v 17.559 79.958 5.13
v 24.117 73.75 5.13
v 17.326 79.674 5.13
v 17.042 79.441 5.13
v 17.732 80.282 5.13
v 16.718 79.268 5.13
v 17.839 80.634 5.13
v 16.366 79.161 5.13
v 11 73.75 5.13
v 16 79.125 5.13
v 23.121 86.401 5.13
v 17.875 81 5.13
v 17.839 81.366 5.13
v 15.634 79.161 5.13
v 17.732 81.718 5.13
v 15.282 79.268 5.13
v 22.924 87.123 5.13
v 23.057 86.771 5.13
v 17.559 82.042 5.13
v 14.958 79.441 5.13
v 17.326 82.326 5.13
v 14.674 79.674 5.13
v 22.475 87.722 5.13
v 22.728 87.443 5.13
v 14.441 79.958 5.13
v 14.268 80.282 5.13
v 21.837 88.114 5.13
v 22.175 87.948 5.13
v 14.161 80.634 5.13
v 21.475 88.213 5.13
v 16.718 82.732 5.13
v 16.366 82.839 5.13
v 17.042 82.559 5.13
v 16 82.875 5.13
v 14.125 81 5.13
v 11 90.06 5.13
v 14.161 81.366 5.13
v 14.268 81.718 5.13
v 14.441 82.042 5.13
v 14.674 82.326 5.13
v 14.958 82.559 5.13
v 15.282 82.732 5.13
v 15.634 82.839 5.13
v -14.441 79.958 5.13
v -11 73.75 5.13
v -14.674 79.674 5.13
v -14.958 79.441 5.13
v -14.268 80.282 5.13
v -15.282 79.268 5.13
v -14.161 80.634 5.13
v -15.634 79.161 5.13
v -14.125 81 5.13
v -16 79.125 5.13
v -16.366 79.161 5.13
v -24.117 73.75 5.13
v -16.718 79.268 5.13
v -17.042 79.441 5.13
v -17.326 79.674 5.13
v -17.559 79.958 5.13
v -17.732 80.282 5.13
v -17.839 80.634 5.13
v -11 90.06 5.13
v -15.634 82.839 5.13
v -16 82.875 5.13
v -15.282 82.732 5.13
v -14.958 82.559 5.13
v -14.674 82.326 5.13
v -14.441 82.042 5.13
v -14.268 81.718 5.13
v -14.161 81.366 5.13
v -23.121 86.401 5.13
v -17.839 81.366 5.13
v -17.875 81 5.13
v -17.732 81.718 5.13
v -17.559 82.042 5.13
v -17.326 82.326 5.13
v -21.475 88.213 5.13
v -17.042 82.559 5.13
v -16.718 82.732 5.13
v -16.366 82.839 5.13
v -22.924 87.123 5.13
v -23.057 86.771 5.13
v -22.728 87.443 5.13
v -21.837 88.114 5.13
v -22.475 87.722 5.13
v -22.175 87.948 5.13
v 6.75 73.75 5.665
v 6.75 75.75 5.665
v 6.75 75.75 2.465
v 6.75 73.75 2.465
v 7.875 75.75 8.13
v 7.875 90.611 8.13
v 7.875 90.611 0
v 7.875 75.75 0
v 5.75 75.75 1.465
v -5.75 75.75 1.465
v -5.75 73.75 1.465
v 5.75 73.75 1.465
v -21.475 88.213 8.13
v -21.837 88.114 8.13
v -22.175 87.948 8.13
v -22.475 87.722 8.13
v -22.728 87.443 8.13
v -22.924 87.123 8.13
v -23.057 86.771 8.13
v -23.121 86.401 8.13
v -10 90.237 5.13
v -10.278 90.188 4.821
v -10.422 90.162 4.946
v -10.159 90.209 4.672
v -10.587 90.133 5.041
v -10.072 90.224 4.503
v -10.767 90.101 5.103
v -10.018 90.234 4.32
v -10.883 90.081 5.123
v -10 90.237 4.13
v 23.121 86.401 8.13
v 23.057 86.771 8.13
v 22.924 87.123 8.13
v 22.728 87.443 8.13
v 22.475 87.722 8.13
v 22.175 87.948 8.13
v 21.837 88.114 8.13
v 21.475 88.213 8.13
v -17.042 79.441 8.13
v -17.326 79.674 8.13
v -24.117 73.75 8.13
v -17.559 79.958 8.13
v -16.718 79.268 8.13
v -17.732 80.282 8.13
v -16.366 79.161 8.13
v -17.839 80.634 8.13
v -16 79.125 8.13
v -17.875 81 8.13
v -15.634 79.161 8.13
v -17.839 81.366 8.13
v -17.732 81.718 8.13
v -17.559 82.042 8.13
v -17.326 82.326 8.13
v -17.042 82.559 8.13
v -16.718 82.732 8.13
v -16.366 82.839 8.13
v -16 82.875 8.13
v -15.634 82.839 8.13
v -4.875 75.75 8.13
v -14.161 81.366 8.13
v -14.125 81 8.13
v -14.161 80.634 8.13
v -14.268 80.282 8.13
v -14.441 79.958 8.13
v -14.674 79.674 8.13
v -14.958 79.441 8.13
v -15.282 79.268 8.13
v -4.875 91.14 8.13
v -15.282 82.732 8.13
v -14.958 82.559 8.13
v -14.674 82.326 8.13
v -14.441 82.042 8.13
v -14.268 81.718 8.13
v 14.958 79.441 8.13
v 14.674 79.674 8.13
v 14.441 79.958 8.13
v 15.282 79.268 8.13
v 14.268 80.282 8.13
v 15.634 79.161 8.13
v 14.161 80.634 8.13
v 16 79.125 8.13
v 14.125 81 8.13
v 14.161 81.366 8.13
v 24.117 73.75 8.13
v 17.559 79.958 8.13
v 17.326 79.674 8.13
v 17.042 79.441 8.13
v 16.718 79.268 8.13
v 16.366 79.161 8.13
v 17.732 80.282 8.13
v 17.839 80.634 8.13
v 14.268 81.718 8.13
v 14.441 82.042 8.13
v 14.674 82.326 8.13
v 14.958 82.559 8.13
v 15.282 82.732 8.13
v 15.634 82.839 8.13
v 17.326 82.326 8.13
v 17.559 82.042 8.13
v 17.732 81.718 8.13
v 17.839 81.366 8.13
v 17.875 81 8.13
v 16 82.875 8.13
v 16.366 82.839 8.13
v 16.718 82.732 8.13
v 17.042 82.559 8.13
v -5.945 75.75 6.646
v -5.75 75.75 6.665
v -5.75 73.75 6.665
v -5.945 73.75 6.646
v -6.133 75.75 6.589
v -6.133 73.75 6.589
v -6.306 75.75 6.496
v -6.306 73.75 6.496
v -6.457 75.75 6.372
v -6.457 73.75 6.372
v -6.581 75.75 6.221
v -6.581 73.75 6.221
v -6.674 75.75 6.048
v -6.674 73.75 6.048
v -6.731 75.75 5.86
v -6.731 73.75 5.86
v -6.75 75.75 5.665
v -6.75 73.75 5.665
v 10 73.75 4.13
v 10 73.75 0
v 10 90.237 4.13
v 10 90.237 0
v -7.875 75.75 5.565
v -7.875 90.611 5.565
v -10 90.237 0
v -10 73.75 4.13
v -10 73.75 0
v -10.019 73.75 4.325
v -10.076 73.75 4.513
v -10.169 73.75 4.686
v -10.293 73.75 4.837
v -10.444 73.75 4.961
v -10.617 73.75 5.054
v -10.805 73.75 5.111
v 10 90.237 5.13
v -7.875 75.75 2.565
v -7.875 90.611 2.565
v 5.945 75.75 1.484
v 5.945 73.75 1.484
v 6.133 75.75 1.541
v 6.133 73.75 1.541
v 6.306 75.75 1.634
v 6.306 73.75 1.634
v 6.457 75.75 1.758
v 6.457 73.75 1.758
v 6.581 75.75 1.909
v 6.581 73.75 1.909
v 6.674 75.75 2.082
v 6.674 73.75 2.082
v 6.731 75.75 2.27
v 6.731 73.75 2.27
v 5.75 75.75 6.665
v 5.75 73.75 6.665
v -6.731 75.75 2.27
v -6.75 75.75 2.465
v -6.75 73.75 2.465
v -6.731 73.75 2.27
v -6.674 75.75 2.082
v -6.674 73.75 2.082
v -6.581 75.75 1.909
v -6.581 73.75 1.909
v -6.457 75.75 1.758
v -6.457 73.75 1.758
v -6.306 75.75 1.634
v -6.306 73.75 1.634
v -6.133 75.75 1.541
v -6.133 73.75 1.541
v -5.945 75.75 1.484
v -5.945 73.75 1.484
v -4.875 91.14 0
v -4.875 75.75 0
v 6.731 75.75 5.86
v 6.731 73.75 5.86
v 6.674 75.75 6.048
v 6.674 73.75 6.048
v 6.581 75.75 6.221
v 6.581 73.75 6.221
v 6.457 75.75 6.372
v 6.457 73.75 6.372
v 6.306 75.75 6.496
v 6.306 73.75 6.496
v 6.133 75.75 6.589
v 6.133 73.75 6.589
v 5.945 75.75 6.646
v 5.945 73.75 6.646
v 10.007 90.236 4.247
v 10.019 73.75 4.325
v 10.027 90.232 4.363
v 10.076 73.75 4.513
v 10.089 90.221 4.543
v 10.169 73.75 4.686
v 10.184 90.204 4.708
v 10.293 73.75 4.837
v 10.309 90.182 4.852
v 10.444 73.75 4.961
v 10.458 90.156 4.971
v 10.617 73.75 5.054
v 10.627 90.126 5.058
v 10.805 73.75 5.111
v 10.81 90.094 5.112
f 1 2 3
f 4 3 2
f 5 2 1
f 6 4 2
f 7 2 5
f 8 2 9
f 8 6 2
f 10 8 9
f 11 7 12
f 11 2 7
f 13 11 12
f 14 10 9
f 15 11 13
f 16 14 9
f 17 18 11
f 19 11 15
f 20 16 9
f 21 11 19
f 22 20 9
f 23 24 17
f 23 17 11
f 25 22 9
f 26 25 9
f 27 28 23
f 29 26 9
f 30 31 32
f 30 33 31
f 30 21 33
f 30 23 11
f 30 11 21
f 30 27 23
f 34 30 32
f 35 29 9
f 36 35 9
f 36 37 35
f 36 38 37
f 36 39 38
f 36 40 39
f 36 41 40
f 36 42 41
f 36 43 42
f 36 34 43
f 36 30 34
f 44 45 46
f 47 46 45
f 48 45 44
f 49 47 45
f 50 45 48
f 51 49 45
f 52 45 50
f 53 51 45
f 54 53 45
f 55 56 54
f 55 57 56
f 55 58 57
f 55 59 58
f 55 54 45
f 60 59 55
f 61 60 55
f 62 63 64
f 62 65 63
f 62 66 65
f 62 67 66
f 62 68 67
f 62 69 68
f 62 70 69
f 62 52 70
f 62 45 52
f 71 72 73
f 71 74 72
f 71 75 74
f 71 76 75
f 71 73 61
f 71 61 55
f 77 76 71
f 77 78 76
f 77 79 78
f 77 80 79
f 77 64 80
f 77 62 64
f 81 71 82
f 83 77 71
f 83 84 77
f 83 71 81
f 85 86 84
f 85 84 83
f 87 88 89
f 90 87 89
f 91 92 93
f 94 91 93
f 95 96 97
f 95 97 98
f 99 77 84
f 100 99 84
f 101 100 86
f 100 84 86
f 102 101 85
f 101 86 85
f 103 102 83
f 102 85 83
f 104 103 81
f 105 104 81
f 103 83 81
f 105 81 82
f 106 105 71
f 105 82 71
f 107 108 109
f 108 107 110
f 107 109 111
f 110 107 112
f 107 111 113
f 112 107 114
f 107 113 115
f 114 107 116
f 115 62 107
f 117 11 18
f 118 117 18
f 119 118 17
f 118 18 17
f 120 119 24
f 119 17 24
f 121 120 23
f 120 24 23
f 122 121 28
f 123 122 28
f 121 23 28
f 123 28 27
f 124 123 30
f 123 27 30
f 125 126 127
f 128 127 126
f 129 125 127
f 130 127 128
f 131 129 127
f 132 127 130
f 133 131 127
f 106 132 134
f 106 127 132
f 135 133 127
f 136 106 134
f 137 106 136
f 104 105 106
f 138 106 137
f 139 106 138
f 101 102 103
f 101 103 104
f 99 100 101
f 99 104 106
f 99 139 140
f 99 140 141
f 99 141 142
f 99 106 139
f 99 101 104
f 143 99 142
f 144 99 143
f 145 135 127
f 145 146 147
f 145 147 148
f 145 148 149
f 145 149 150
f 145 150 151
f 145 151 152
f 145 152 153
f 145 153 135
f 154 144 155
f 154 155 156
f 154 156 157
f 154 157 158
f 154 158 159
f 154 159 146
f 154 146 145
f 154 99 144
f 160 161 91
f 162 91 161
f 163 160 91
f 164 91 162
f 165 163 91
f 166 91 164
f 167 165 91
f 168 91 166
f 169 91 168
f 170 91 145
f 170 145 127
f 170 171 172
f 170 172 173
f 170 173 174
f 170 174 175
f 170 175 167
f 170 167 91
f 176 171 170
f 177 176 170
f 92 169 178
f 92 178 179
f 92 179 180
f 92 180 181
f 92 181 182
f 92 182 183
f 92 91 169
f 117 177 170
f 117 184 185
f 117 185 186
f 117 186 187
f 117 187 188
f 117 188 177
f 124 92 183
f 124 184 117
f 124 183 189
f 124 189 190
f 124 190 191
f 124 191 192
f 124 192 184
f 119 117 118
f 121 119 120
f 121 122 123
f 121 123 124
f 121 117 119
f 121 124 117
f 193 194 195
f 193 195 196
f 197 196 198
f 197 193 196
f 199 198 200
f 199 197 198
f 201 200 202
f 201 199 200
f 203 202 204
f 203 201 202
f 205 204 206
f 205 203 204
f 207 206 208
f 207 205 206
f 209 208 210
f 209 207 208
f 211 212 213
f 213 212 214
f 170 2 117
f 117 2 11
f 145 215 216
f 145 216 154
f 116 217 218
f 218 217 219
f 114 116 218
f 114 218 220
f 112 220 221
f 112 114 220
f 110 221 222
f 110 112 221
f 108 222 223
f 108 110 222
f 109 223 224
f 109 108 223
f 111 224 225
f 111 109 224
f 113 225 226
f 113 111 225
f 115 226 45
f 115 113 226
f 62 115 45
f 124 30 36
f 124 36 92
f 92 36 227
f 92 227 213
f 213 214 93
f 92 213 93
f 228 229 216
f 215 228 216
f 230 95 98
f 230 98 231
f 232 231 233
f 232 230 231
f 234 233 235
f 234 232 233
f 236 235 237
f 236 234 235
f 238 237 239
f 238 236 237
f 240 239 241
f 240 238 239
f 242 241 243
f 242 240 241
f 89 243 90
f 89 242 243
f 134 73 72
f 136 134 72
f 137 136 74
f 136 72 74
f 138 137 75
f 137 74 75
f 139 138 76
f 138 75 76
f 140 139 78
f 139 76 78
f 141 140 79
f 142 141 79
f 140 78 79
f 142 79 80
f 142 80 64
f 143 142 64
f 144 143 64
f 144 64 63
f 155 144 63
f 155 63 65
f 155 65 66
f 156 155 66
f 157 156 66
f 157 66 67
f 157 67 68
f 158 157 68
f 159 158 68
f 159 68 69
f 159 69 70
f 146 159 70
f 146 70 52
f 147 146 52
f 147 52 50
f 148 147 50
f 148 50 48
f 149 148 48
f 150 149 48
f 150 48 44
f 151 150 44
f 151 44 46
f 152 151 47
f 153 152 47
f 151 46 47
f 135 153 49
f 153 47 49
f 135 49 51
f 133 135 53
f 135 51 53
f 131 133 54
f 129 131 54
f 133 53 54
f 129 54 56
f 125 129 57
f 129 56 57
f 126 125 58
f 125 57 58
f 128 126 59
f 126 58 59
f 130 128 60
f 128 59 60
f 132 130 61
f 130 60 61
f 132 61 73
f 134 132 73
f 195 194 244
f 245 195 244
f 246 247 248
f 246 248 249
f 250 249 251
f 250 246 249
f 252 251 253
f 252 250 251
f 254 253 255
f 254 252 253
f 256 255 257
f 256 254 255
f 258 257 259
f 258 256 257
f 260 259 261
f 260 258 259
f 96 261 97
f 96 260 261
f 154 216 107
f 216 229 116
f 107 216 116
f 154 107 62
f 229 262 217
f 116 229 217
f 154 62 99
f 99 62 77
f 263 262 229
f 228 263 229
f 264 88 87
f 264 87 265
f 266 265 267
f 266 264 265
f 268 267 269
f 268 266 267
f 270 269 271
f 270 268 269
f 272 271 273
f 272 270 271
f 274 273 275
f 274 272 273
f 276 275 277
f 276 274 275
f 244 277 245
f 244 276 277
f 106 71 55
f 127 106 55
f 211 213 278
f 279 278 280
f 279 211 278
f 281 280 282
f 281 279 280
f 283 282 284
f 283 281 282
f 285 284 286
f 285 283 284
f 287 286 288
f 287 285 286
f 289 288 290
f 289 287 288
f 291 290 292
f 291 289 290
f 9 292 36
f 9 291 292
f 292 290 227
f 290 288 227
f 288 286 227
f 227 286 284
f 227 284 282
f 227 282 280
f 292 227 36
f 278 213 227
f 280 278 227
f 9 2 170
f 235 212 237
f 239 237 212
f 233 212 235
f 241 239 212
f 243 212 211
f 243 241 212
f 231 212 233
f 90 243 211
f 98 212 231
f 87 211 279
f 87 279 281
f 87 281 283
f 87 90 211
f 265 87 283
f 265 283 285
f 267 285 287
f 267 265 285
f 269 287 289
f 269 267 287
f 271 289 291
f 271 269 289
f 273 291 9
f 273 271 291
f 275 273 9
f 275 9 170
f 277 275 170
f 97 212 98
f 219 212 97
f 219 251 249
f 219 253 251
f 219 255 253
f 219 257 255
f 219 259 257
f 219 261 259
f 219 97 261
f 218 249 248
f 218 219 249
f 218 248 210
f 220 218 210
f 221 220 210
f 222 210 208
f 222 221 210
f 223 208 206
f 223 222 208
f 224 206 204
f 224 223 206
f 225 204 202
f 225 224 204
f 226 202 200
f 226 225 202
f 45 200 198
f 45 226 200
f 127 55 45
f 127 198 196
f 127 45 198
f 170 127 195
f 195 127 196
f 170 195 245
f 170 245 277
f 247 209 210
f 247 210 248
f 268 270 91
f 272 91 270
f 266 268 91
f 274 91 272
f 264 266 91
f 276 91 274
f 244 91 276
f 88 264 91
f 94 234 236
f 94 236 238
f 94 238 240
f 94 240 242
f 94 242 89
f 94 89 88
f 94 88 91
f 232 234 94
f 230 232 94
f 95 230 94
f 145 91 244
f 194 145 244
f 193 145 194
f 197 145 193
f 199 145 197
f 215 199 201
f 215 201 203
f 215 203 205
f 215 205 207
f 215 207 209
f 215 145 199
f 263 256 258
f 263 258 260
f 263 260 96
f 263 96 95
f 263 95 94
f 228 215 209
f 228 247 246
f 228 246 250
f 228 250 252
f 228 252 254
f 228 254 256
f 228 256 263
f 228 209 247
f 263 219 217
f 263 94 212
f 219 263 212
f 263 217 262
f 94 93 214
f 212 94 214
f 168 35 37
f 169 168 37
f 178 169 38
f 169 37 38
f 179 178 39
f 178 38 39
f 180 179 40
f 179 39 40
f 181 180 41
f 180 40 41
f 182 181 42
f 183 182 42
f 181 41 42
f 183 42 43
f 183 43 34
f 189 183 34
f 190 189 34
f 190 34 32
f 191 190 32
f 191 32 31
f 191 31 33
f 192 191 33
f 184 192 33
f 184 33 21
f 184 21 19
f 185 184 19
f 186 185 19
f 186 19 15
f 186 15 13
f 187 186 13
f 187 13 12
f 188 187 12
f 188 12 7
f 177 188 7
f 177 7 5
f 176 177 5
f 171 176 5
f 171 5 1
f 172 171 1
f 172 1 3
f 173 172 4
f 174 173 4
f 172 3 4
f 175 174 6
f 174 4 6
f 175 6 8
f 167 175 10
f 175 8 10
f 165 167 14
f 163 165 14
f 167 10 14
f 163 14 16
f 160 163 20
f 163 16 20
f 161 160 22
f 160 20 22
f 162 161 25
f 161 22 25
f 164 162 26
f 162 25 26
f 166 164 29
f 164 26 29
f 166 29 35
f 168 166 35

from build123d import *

# Parameters (mm, degrees)
SKETCH1_R           = 1.5
BOSS_EXTRUDE1_DEPTH = 8.13
CUT_EXTRUDE1_DEPTH  = 16.25
CUT_EXTRUDE2_REACH  = 32.018
SKETCH3_W           = 13.5
SKETCH3_H           = 5.2
SKETCH4_R           = 1.5
CUT_EXTRUDE3_DEPTH  = 5.13
CUT_EXTRUDE4_REACH  = 96.714
SKETCH5_W           = 48.91393719
SKETCH5_H           = 4.31806182
FILLET1_R           = 1
CUT_EXTRUDE6_REACH  = 96.417
SKETCH8_R           = 1.875


with BuildPart() as part:
    # Sketch1 → Boss-Extrude1 (new body)
    with BuildSketch(Plane.XY):
        with BuildLine():
            Line((-24.456968595, 69.43193818), (24.456968595, 69.43193818))
            Line((24.456968595, 69.43193818), (23.121499045, 86.400687699))
            ThreePointArc((23.121499045, 86.400687699), (22.608100633, 87.588503122), (21.474960733, 88.213385013))
            Line((21.474960733, 88.213385013), (0, 92))
            Line((0, 92), (-21.474960733, 88.213385013))
            ThreePointArc((-21.474960733, 88.213385013), (-22.608100633, 87.588503122), (-23.121499045, 86.400687699))
            Line((-23.121499045, 86.400687699), (-24.456968595, 69.43193818))
        make_face()
        with Locations((-16, 81)):
            Circle(SKETCH1_R, mode=Mode.SUBTRACT)
        with Locations((16, 81)):
            Circle(SKETCH1_R, mode=Mode.SUBTRACT)
    extrude(amount=BOSS_EXTRUDE1_DEPTH)

    # Sketch2 → Cut-Extrude1 (cut)
    with BuildSketch(Plane(origin=(0, 92, 0), x_dir=(1, 0, 0), z_dir=(0, 1, 0))):
        Polygon((7.875, 0), (-4.875, 0), (-7.875, -2.565), (-7.875, -5.565), (-4.875, -8.13), (7.875, -8.13), align=None)
    extrude(amount=-CUT_EXTRUDE1_DEPTH, mode=Mode.SUBTRACT)

    # Sketch3 → Cut-Extrude2 (cut, up to next)
    with BuildSketch(Plane(origin=(0, 75.75, 0), x_dir=(1, 0, 0), z_dir=(0, 1, 0)), mode=Mode.PRIVATE) as cut_extrude2_sk1:
        with Locations((0, -4.065)):
            Rectangle(SKETCH3_W, SKETCH3_H)
    cut_extrude2_tool1 = extrude(cut_extrude2_sk1.sketch, amount=-CUT_EXTRUDE2_REACH, mode=Mode.PRIVATE) & part.part
    add(cut_extrude2_tool1.solids().sort_by_distance((0, 75.75, 4.065))[0], mode=Mode.SUBTRACT)

    # Sketch4 → Cut-Extrude3 (cut)
    # profile 1 of 2: a face of its own
    with BuildSketch(Plane(origin=(0, 0, 0), x_dir=(-1, 0, 0), z_dir=(0, 0, -1))):
        with BuildLine():
            Line((-10, 69.43193818), (-10, 90.236730193))
            Line((-10, 90.236730193), (-21.474960733, 88.213385013))
            ThreePointArc((-21.474960733, 88.213385013), (-22.608100633, 87.588503122), (-23.121499045, 86.400687699))
            Line((-23.121499045, 86.400687699), (-24.456968595, 69.43193818))
            Line((-24.456968595, 69.43193818), (-10, 69.43193818))
        make_face()
        with Locations(Location((-16, 81, 0), (0, 0, 180))):
            Circle(SKETCH4_R, mode=Mode.SUBTRACT)
    # profile 2 of 2: a face of its own
    with BuildSketch(Plane(origin=(0, 0, 0), x_dir=(-1, 0, 0), z_dir=(0, 0, -1))):
        with BuildLine():
            Line((10, 90.236730193), (10, 69.43193818))
            Line((10, 69.43193818), (24.456968595, 69.43193818))
            Line((24.456968595, 69.43193818), (23.121499045, 86.400687699))
            ThreePointArc((23.121499045, 86.400687699), (22.608100633, 87.588503122), (21.474960733, 88.213385013))
            Line((21.474960733, 88.213385013), (10, 90.236730193))
        make_face()
        with Locations(Location((16, 81, 0), (0, 0, 180))):
            Circle(SKETCH4_R, mode=Mode.SUBTRACT)
    extrude(amount=-CUT_EXTRUDE3_DEPTH, mode=Mode.SUBTRACT)

    # Sketch5 → Cut-Extrude4 (cut, up to next)
    with BuildSketch(Plane(origin=(0, 0, 0), x_dir=(-1, 0, 0), z_dir=(0, 0, -1)), mode=Mode.PRIVATE) as cut_extrude4_sk1:
        with Locations((0, 71.59096909)):
            Rectangle(SKETCH5_W, SKETCH5_H)
    cut_extrude4_tool1 = extrude(cut_extrude4_sk1.sketch, amount=-CUT_EXTRUDE4_REACH, mode=Mode.PRIVATE) & part.part
    add(cut_extrude4_tool1.solids().sort_by_distance((0, 71.590969, 0))[0], mode=Mode.SUBTRACT)

    # Fillet1
    # the kernel refuses this fillet: 1 mm, written as the material it adds along each edge
    with BuildSketch(Plane(origin=(-10, 92.736730193, 5.13), x_dir=(-1, 0, 0), z_dir=(0, -1, 0))) as fillet1_piece_1_section:
        with BuildLine():
            CenterArc((FILLET1_R, FILLET1_R), FILLET1_R, 180, 90)
            Line((0, FILLET1_R), (0, 0))
            Line((0, 0), (FILLET1_R, 0))
        make_face()
    fillet1_piece_1 = extrude(amount=18.986730193, mode=Mode.PRIVATE)
    fillet1_piece_1 = split(fillet1_piece_1, bisect_by=Plane(origin=(-11.632189481, 89.94893115, 4.903310521), z_dir=(0.17364817766693327, -0.9848077530122076, 0)), keep=Keep.TOP, mode=Mode.PRIVATE)
    add(fillet1_piece_1)
    with BuildSketch(Plane(origin=(6.75, 75.75, 1.465), x_dir=(0, 0, 1), z_dir=(0, -1, 0)), Plane(origin=(-6.75, 75.75, 6.665), x_dir=(0, 0, -1), z_dir=(0, -1, 0)), Plane(origin=(6.75, 75.75, 6.665), x_dir=(-1, 0, 0), z_dir=(0, -1, 0))) as fillet1_piece_2:
        with BuildLine():
            CenterArc((FILLET1_R, FILLET1_R), FILLET1_R, 180, 90)
            Line((0, FILLET1_R), (0, 0))
            Line((0, 0), (FILLET1_R, 0))
        make_face()
    extrude(amount=2)
    with BuildSketch(Plane(origin=(-6.75, 75.75, 1.465), x_dir=(0, 0, 1), z_dir=(0, -1, 0))) as fillet1_piece_3:
        with BuildLine():
            CenterArc((FILLET1_R, -FILLET1_R), FILLET1_R, 90, 90)
            Line((0, -FILLET1_R), (0, 0))
            Line((0, 0), (FILLET1_R, 0))
        make_face()
    extrude(amount=2)
    with BuildSketch(Plane(origin=(10, 73.75, 5.13), x_dir=(0, 0, -1), z_dir=(0, 1, 0))) as fillet1_piece_4_section:
        with BuildLine():
            CenterArc((FILLET1_R, -FILLET1_R), FILLET1_R, 90, 90)
            Line((0, -FILLET1_R), (0, 0))
            Line((0, 0), (FILLET1_R, 0))
        make_face()
    fillet1_piece_4 = extrude(amount=18.986730193, mode=Mode.PRIVATE)
    fillet1_piece_4 = split(fillet1_piece_4, bisect_by=Plane(origin=(11.632189481, 89.94893115, 4.903310521), z_dir=(-0.17364817766693252, -0.9848077530122077, 0)), keep=Keep.TOP, mode=Mode.PRIVATE)
    add(fillet1_piece_4)

    # Sketch8 → Cut-Extrude6 (cut, up to next)
    with BuildSketch(Plane(origin=(0, 0, 5.13), x_dir=(-1, 0, 0), z_dir=(0, 0, -1)), mode=Mode.PRIVATE) as cut_extrude6_sk1:
        with Locations((16, 81)):
            Circle(SKETCH8_R)
    cut_extrude6_tool1 = extrude(cut_extrude6_sk1.sketch, amount=-CUT_EXTRUDE6_REACH, mode=Mode.PRIVATE) & part.part
    # Sketch8 → Cut-Extrude6 (cut, up to next)
    with BuildSketch(Plane(origin=(0, 0, 5.13), x_dir=(-1, 0, 0), z_dir=(0, 0, -1)), mode=Mode.PRIVATE) as cut_extrude6_sk2:
        with Locations((-16, 81)):
            Circle(SKETCH8_R)
    cut_extrude6_tool2 = extrude(cut_extrude6_sk2.sketch, amount=-CUT_EXTRUDE6_REACH, mode=Mode.PRIVATE) & part.part
    add(cut_extrude6_tool1.solids().sort_by_distance((-16, 81, 5.13))[0], mode=Mode.SUBTRACT)
    add(cut_extrude6_tool2.solids().sort_by_distance((16, 81, 5.13))[0], mode=Mode.SUBTRACT)


solid = part.part
